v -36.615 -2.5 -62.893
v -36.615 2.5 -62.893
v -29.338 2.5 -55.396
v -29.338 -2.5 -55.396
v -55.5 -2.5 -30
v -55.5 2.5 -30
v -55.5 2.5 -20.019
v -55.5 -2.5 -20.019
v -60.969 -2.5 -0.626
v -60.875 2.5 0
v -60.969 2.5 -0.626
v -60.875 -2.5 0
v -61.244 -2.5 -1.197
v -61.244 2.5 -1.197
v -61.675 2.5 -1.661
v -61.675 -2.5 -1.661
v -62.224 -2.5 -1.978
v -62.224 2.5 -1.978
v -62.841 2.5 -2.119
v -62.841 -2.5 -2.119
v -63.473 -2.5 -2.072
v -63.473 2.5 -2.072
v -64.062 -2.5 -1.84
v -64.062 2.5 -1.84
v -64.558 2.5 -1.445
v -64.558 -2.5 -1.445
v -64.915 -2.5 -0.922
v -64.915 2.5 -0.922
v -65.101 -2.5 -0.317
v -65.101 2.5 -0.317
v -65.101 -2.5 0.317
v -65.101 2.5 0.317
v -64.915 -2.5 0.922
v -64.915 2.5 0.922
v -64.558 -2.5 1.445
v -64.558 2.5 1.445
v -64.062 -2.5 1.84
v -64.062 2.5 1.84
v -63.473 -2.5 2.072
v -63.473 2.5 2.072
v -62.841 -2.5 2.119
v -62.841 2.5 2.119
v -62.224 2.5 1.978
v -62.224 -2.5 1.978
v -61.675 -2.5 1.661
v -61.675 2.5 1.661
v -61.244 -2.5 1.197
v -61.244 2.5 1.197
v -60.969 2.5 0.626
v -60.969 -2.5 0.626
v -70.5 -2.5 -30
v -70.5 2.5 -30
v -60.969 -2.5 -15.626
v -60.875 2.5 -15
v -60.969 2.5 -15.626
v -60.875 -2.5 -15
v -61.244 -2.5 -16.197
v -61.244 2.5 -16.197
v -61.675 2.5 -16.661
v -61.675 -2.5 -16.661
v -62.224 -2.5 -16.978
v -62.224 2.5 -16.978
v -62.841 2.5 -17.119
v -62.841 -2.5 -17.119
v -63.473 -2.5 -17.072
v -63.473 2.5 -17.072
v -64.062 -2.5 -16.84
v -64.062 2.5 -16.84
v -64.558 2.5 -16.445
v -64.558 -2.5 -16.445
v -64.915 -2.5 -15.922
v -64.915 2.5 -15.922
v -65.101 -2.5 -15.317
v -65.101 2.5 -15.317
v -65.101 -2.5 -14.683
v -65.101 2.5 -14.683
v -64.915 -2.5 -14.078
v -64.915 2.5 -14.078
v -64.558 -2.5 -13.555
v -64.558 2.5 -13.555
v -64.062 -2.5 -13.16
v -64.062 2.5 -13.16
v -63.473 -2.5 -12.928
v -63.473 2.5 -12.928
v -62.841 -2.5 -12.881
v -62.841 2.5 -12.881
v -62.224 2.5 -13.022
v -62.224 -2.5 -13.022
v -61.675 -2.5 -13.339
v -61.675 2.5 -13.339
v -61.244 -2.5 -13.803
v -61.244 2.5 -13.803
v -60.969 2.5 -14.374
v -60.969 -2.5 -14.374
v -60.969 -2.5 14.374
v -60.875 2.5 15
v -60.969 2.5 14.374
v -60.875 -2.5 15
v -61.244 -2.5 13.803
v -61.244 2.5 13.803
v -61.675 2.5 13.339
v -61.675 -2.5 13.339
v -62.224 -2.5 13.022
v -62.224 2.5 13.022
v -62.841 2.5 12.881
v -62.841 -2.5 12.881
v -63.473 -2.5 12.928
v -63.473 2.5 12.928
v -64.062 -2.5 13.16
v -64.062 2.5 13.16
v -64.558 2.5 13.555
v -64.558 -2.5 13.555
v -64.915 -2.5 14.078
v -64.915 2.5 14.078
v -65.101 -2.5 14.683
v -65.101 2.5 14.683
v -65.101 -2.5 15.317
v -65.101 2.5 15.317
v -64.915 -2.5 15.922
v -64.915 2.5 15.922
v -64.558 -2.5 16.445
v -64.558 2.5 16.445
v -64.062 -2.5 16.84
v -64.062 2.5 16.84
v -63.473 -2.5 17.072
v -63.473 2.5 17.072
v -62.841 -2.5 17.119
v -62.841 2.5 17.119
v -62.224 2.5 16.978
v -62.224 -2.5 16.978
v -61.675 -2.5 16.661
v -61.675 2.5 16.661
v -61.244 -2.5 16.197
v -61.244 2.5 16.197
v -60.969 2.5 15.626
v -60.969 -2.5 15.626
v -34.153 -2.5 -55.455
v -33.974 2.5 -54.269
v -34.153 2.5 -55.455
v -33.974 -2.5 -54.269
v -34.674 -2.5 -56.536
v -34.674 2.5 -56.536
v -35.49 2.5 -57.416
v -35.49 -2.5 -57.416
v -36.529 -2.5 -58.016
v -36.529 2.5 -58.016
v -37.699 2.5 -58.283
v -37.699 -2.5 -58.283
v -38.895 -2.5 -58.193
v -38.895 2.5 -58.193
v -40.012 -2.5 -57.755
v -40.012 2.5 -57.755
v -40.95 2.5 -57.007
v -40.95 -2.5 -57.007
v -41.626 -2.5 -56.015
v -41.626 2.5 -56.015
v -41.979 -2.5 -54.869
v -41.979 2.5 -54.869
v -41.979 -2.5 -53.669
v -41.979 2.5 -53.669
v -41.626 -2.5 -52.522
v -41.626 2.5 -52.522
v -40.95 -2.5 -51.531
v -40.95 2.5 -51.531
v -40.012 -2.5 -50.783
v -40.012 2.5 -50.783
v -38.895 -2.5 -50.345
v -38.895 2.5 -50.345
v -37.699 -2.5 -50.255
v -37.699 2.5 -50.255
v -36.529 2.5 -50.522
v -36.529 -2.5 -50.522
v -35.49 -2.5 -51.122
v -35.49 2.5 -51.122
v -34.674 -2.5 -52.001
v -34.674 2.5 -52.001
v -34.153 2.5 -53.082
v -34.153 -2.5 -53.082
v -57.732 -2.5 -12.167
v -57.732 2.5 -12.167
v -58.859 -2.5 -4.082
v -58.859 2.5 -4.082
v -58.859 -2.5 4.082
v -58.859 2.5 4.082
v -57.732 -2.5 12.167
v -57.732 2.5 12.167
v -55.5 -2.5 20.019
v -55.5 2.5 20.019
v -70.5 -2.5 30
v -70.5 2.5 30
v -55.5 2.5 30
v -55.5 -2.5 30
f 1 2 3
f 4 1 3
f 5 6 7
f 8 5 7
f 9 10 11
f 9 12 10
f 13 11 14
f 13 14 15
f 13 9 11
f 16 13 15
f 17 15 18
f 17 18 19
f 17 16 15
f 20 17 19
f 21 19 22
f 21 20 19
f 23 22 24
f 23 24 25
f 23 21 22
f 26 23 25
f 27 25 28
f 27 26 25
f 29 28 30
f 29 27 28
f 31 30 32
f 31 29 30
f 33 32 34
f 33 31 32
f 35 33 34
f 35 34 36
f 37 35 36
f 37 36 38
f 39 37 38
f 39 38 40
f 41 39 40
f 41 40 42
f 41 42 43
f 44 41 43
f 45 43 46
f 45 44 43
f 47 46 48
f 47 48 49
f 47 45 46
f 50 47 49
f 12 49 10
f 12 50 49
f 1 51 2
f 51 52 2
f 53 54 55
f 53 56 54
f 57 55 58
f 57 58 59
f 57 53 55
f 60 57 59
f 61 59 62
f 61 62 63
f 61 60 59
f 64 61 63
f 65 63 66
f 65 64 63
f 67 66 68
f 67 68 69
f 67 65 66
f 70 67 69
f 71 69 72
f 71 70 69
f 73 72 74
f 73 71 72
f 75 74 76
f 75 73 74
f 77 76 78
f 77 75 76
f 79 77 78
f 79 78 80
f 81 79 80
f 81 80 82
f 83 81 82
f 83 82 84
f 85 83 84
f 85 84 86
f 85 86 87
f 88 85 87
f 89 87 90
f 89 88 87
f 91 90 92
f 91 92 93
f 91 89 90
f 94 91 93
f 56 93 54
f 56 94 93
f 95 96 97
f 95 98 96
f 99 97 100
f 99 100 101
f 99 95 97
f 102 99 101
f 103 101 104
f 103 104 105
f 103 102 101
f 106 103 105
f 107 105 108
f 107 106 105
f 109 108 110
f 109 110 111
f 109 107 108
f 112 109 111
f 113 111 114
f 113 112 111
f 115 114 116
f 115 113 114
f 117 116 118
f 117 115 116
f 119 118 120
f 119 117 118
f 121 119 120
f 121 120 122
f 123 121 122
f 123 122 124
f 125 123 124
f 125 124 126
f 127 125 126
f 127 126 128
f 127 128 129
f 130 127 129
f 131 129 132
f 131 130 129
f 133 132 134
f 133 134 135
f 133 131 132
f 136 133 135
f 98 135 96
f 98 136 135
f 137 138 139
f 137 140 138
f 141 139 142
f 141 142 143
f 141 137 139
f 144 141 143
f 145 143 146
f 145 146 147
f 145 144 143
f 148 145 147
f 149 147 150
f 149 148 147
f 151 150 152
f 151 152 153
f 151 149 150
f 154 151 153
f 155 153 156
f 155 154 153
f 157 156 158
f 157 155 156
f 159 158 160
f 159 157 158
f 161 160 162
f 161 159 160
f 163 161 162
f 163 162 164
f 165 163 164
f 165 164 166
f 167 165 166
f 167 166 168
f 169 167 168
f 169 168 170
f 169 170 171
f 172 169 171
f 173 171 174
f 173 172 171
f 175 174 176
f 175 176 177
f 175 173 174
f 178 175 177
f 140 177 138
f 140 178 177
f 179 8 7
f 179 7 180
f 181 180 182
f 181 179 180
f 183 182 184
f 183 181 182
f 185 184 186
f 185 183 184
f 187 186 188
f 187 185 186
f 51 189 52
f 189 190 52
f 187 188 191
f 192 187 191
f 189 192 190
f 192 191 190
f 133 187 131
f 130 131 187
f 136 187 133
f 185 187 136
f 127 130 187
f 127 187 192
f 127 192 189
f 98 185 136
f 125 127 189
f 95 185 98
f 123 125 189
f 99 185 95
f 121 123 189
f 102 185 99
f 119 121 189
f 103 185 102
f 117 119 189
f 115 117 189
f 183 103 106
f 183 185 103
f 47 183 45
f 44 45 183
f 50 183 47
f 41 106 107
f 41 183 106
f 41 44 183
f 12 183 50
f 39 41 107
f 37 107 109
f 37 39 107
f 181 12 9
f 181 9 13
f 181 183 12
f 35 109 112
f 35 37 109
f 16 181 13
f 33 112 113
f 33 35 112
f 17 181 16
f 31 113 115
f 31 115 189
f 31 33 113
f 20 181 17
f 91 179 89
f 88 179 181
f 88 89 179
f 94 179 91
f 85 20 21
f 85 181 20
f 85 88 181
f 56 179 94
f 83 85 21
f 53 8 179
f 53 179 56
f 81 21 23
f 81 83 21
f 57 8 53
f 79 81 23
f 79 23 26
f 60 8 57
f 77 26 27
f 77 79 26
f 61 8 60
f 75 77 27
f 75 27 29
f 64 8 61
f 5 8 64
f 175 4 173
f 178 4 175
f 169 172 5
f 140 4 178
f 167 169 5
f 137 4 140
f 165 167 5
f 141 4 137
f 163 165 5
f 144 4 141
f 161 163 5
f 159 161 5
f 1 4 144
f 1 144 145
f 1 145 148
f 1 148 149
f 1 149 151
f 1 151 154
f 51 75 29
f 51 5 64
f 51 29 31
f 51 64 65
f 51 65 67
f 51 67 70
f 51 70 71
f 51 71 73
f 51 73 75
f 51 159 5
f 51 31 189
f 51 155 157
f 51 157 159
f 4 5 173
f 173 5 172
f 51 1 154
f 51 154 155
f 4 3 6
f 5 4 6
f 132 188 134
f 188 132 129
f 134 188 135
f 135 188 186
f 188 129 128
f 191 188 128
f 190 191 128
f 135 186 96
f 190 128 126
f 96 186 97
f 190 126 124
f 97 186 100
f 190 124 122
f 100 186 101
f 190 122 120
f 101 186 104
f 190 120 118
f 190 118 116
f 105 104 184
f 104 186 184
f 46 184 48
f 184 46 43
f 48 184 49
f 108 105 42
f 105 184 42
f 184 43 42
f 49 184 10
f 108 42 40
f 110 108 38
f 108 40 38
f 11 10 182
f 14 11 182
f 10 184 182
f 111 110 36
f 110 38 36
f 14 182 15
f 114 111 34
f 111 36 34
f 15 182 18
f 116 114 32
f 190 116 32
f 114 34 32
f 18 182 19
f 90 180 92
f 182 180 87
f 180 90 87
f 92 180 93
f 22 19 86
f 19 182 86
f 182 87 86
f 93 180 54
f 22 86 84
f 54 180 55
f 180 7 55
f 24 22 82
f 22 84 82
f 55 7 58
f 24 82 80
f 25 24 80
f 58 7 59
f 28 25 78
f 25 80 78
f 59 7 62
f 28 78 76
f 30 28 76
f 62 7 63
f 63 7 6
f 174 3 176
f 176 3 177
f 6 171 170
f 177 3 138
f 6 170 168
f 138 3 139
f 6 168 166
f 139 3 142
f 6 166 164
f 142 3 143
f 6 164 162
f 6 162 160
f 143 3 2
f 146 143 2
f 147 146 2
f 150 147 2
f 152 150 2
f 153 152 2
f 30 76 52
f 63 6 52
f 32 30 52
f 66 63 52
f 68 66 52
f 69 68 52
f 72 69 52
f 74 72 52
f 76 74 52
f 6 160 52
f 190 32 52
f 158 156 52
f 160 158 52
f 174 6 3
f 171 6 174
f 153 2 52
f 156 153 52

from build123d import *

# Parameters (mm, degrees)
SKETCH1_R               = 4.025
SKETCH1_R_2             = 2.125
BOSS_EXTRUDE1_DEPTH     = 2.5
SKETCH2_R               = 59
CUT_EXTRUDE1_DEPTH      = 3.5
CUT_EXTRUDE1_DEPTH_BACK = 3.5


with BuildPart() as part:
    # Sketch1 → Boss-Extrude1 (new body, symmetric)
    with BuildSketch(Plane(origin=(0, 0, 0), x_dir=(1, 0, 0), z_dir=(0, 1, 0))):
        Polygon((-55.5, 30), (-55.5, -30), (-70.5, -30), (-70.5, 30), (-36.615368979, 62.892866181), (-29.338096583, 55.396174082), align=None)
        with Locations((-37.999438908, 54.268822934)):
            Circle(SKETCH1_R, mode=Mode.SUBTRACT)
        with Locations((-63, 0)):
            Circle(SKETCH1_R_2, mode=Mode.SUBTRACT)
        with Locations((-63, -15)):
            Circle(SKETCH1_R_2, mode=Mode.SUBTRACT)
        with Locations((-63, 15)):
            Circle(SKETCH1_R_2, mode=Mode.SUBTRACT)
    extrude(amount=BOSS_EXTRUDE1_DEPTH, both=True)

    # Sketch2 → Cut-Extrude1 (cut, two sides)
    with BuildSketch(Plane(origin=(0, 0, 0), x_dir=(1, 0, 0), z_dir=(0, 1, 0))) as cut_extrude1_sk:
        Circle(SKETCH2_R)
    extrude(amount=CUT_EXTRUDE1_DEPTH, mode=Mode.SUBTRACT)
    extrude(cut_extrude1_sk.sketch, amount=-CUT_EXTRUDE1_DEPTH_BACK, mode=Mode.SUBTRACT)


solid = part.part
